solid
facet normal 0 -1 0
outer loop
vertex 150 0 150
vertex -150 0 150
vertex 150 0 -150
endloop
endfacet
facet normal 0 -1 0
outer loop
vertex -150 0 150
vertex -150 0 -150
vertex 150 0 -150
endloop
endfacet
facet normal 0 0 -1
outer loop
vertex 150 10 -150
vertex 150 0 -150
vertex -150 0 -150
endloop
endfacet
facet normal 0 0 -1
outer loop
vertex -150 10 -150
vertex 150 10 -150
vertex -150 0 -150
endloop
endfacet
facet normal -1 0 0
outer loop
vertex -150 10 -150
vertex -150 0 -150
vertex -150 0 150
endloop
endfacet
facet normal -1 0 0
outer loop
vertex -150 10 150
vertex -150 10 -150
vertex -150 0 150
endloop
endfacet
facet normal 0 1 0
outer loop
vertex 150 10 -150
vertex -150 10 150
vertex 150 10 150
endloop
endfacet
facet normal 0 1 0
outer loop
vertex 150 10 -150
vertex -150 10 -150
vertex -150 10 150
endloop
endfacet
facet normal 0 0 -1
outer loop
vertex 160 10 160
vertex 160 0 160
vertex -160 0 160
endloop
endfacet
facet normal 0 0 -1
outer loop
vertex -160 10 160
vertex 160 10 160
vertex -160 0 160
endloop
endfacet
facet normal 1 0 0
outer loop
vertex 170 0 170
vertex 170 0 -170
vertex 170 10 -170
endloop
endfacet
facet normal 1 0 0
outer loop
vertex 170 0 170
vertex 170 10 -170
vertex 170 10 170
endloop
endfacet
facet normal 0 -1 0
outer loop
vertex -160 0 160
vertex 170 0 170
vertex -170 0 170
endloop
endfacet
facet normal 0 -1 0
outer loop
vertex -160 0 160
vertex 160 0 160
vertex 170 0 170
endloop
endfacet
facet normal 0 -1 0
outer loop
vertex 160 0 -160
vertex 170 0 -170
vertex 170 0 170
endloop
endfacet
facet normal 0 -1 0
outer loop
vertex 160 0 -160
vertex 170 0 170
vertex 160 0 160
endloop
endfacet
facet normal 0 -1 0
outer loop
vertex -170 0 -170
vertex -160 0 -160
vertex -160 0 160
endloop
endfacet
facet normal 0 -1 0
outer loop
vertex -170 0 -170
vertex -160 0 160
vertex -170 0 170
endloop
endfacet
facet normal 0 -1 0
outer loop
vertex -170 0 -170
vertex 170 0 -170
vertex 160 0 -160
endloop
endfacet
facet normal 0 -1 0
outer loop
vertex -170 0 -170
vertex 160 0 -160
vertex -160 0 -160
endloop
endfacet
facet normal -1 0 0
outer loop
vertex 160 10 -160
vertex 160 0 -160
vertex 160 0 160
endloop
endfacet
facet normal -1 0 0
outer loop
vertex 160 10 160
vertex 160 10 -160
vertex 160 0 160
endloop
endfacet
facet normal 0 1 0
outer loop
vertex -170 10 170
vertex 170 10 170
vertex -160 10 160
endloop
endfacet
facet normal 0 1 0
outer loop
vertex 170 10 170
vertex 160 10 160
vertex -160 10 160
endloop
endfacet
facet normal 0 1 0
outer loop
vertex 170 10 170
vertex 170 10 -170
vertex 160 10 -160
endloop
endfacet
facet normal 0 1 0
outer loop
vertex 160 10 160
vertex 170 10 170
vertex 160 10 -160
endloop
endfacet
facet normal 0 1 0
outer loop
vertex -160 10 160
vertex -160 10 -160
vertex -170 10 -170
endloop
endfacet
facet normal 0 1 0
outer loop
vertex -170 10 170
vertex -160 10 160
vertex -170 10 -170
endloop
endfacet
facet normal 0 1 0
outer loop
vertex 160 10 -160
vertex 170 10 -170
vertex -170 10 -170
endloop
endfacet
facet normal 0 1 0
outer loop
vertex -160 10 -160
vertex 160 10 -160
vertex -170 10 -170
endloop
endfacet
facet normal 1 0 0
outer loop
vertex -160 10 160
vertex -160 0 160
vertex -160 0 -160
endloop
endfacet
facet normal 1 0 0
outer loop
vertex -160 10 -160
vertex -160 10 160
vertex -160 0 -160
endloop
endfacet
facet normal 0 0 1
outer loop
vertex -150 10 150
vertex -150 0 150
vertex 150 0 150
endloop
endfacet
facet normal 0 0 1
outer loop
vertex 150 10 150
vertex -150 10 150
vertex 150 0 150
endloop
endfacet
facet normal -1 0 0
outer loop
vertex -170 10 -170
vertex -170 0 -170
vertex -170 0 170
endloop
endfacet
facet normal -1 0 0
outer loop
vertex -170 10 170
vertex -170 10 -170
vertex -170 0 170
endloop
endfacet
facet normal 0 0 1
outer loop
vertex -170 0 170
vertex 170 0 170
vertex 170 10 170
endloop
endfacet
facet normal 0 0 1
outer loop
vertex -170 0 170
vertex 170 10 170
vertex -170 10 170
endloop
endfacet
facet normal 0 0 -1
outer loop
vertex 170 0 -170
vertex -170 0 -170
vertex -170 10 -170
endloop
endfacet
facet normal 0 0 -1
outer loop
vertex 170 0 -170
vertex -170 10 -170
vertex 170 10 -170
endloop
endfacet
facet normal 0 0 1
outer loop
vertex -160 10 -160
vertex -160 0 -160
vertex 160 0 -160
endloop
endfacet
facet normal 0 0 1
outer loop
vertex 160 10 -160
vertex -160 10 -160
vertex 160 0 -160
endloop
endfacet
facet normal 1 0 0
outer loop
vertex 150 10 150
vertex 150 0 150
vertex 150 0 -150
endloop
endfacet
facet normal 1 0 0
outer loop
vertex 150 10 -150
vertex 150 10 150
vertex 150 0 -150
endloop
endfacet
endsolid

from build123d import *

# Parameters (mm, degrees)
SKETCH1_W           = 150
SKETCH1_H           = 150
BOSS_EXTRUDE1_DEPTH = 10


with BuildPart() as part:
    # Sketch1 → Boss-Extrude1 (new body)
    with BuildSketch(Plane(origin=(0, 0, 0), x_dir=(1, 0, 0), z_dir=(0, 1, 0))):
        Polygon((170, -170), (-170, -170), (-170, 0), (-170, 170), (170, 170), align=None)
        Polygon((160, -160), (-160, -160), (-160, 0), (-160, 160), (160, 160), align=None, mode=Mode.SUBTRACT)
        with Locations((-75, -75)):
            Rectangle(SKETCH1_W, SKETCH1_H)
        with Locations((-75, 75)):
            Rectangle(SKETCH1_W, SKETCH1_H)
        with Locations((75, 75)):
            Rectangle(SKETCH1_W, SKETCH1_H)
        with Locations((75, -75)):
            Rectangle(SKETCH1_W, SKETCH1_H)
    extrude(amount=BOSS_EXTRUDE1_DEPTH)


solid = part.part
